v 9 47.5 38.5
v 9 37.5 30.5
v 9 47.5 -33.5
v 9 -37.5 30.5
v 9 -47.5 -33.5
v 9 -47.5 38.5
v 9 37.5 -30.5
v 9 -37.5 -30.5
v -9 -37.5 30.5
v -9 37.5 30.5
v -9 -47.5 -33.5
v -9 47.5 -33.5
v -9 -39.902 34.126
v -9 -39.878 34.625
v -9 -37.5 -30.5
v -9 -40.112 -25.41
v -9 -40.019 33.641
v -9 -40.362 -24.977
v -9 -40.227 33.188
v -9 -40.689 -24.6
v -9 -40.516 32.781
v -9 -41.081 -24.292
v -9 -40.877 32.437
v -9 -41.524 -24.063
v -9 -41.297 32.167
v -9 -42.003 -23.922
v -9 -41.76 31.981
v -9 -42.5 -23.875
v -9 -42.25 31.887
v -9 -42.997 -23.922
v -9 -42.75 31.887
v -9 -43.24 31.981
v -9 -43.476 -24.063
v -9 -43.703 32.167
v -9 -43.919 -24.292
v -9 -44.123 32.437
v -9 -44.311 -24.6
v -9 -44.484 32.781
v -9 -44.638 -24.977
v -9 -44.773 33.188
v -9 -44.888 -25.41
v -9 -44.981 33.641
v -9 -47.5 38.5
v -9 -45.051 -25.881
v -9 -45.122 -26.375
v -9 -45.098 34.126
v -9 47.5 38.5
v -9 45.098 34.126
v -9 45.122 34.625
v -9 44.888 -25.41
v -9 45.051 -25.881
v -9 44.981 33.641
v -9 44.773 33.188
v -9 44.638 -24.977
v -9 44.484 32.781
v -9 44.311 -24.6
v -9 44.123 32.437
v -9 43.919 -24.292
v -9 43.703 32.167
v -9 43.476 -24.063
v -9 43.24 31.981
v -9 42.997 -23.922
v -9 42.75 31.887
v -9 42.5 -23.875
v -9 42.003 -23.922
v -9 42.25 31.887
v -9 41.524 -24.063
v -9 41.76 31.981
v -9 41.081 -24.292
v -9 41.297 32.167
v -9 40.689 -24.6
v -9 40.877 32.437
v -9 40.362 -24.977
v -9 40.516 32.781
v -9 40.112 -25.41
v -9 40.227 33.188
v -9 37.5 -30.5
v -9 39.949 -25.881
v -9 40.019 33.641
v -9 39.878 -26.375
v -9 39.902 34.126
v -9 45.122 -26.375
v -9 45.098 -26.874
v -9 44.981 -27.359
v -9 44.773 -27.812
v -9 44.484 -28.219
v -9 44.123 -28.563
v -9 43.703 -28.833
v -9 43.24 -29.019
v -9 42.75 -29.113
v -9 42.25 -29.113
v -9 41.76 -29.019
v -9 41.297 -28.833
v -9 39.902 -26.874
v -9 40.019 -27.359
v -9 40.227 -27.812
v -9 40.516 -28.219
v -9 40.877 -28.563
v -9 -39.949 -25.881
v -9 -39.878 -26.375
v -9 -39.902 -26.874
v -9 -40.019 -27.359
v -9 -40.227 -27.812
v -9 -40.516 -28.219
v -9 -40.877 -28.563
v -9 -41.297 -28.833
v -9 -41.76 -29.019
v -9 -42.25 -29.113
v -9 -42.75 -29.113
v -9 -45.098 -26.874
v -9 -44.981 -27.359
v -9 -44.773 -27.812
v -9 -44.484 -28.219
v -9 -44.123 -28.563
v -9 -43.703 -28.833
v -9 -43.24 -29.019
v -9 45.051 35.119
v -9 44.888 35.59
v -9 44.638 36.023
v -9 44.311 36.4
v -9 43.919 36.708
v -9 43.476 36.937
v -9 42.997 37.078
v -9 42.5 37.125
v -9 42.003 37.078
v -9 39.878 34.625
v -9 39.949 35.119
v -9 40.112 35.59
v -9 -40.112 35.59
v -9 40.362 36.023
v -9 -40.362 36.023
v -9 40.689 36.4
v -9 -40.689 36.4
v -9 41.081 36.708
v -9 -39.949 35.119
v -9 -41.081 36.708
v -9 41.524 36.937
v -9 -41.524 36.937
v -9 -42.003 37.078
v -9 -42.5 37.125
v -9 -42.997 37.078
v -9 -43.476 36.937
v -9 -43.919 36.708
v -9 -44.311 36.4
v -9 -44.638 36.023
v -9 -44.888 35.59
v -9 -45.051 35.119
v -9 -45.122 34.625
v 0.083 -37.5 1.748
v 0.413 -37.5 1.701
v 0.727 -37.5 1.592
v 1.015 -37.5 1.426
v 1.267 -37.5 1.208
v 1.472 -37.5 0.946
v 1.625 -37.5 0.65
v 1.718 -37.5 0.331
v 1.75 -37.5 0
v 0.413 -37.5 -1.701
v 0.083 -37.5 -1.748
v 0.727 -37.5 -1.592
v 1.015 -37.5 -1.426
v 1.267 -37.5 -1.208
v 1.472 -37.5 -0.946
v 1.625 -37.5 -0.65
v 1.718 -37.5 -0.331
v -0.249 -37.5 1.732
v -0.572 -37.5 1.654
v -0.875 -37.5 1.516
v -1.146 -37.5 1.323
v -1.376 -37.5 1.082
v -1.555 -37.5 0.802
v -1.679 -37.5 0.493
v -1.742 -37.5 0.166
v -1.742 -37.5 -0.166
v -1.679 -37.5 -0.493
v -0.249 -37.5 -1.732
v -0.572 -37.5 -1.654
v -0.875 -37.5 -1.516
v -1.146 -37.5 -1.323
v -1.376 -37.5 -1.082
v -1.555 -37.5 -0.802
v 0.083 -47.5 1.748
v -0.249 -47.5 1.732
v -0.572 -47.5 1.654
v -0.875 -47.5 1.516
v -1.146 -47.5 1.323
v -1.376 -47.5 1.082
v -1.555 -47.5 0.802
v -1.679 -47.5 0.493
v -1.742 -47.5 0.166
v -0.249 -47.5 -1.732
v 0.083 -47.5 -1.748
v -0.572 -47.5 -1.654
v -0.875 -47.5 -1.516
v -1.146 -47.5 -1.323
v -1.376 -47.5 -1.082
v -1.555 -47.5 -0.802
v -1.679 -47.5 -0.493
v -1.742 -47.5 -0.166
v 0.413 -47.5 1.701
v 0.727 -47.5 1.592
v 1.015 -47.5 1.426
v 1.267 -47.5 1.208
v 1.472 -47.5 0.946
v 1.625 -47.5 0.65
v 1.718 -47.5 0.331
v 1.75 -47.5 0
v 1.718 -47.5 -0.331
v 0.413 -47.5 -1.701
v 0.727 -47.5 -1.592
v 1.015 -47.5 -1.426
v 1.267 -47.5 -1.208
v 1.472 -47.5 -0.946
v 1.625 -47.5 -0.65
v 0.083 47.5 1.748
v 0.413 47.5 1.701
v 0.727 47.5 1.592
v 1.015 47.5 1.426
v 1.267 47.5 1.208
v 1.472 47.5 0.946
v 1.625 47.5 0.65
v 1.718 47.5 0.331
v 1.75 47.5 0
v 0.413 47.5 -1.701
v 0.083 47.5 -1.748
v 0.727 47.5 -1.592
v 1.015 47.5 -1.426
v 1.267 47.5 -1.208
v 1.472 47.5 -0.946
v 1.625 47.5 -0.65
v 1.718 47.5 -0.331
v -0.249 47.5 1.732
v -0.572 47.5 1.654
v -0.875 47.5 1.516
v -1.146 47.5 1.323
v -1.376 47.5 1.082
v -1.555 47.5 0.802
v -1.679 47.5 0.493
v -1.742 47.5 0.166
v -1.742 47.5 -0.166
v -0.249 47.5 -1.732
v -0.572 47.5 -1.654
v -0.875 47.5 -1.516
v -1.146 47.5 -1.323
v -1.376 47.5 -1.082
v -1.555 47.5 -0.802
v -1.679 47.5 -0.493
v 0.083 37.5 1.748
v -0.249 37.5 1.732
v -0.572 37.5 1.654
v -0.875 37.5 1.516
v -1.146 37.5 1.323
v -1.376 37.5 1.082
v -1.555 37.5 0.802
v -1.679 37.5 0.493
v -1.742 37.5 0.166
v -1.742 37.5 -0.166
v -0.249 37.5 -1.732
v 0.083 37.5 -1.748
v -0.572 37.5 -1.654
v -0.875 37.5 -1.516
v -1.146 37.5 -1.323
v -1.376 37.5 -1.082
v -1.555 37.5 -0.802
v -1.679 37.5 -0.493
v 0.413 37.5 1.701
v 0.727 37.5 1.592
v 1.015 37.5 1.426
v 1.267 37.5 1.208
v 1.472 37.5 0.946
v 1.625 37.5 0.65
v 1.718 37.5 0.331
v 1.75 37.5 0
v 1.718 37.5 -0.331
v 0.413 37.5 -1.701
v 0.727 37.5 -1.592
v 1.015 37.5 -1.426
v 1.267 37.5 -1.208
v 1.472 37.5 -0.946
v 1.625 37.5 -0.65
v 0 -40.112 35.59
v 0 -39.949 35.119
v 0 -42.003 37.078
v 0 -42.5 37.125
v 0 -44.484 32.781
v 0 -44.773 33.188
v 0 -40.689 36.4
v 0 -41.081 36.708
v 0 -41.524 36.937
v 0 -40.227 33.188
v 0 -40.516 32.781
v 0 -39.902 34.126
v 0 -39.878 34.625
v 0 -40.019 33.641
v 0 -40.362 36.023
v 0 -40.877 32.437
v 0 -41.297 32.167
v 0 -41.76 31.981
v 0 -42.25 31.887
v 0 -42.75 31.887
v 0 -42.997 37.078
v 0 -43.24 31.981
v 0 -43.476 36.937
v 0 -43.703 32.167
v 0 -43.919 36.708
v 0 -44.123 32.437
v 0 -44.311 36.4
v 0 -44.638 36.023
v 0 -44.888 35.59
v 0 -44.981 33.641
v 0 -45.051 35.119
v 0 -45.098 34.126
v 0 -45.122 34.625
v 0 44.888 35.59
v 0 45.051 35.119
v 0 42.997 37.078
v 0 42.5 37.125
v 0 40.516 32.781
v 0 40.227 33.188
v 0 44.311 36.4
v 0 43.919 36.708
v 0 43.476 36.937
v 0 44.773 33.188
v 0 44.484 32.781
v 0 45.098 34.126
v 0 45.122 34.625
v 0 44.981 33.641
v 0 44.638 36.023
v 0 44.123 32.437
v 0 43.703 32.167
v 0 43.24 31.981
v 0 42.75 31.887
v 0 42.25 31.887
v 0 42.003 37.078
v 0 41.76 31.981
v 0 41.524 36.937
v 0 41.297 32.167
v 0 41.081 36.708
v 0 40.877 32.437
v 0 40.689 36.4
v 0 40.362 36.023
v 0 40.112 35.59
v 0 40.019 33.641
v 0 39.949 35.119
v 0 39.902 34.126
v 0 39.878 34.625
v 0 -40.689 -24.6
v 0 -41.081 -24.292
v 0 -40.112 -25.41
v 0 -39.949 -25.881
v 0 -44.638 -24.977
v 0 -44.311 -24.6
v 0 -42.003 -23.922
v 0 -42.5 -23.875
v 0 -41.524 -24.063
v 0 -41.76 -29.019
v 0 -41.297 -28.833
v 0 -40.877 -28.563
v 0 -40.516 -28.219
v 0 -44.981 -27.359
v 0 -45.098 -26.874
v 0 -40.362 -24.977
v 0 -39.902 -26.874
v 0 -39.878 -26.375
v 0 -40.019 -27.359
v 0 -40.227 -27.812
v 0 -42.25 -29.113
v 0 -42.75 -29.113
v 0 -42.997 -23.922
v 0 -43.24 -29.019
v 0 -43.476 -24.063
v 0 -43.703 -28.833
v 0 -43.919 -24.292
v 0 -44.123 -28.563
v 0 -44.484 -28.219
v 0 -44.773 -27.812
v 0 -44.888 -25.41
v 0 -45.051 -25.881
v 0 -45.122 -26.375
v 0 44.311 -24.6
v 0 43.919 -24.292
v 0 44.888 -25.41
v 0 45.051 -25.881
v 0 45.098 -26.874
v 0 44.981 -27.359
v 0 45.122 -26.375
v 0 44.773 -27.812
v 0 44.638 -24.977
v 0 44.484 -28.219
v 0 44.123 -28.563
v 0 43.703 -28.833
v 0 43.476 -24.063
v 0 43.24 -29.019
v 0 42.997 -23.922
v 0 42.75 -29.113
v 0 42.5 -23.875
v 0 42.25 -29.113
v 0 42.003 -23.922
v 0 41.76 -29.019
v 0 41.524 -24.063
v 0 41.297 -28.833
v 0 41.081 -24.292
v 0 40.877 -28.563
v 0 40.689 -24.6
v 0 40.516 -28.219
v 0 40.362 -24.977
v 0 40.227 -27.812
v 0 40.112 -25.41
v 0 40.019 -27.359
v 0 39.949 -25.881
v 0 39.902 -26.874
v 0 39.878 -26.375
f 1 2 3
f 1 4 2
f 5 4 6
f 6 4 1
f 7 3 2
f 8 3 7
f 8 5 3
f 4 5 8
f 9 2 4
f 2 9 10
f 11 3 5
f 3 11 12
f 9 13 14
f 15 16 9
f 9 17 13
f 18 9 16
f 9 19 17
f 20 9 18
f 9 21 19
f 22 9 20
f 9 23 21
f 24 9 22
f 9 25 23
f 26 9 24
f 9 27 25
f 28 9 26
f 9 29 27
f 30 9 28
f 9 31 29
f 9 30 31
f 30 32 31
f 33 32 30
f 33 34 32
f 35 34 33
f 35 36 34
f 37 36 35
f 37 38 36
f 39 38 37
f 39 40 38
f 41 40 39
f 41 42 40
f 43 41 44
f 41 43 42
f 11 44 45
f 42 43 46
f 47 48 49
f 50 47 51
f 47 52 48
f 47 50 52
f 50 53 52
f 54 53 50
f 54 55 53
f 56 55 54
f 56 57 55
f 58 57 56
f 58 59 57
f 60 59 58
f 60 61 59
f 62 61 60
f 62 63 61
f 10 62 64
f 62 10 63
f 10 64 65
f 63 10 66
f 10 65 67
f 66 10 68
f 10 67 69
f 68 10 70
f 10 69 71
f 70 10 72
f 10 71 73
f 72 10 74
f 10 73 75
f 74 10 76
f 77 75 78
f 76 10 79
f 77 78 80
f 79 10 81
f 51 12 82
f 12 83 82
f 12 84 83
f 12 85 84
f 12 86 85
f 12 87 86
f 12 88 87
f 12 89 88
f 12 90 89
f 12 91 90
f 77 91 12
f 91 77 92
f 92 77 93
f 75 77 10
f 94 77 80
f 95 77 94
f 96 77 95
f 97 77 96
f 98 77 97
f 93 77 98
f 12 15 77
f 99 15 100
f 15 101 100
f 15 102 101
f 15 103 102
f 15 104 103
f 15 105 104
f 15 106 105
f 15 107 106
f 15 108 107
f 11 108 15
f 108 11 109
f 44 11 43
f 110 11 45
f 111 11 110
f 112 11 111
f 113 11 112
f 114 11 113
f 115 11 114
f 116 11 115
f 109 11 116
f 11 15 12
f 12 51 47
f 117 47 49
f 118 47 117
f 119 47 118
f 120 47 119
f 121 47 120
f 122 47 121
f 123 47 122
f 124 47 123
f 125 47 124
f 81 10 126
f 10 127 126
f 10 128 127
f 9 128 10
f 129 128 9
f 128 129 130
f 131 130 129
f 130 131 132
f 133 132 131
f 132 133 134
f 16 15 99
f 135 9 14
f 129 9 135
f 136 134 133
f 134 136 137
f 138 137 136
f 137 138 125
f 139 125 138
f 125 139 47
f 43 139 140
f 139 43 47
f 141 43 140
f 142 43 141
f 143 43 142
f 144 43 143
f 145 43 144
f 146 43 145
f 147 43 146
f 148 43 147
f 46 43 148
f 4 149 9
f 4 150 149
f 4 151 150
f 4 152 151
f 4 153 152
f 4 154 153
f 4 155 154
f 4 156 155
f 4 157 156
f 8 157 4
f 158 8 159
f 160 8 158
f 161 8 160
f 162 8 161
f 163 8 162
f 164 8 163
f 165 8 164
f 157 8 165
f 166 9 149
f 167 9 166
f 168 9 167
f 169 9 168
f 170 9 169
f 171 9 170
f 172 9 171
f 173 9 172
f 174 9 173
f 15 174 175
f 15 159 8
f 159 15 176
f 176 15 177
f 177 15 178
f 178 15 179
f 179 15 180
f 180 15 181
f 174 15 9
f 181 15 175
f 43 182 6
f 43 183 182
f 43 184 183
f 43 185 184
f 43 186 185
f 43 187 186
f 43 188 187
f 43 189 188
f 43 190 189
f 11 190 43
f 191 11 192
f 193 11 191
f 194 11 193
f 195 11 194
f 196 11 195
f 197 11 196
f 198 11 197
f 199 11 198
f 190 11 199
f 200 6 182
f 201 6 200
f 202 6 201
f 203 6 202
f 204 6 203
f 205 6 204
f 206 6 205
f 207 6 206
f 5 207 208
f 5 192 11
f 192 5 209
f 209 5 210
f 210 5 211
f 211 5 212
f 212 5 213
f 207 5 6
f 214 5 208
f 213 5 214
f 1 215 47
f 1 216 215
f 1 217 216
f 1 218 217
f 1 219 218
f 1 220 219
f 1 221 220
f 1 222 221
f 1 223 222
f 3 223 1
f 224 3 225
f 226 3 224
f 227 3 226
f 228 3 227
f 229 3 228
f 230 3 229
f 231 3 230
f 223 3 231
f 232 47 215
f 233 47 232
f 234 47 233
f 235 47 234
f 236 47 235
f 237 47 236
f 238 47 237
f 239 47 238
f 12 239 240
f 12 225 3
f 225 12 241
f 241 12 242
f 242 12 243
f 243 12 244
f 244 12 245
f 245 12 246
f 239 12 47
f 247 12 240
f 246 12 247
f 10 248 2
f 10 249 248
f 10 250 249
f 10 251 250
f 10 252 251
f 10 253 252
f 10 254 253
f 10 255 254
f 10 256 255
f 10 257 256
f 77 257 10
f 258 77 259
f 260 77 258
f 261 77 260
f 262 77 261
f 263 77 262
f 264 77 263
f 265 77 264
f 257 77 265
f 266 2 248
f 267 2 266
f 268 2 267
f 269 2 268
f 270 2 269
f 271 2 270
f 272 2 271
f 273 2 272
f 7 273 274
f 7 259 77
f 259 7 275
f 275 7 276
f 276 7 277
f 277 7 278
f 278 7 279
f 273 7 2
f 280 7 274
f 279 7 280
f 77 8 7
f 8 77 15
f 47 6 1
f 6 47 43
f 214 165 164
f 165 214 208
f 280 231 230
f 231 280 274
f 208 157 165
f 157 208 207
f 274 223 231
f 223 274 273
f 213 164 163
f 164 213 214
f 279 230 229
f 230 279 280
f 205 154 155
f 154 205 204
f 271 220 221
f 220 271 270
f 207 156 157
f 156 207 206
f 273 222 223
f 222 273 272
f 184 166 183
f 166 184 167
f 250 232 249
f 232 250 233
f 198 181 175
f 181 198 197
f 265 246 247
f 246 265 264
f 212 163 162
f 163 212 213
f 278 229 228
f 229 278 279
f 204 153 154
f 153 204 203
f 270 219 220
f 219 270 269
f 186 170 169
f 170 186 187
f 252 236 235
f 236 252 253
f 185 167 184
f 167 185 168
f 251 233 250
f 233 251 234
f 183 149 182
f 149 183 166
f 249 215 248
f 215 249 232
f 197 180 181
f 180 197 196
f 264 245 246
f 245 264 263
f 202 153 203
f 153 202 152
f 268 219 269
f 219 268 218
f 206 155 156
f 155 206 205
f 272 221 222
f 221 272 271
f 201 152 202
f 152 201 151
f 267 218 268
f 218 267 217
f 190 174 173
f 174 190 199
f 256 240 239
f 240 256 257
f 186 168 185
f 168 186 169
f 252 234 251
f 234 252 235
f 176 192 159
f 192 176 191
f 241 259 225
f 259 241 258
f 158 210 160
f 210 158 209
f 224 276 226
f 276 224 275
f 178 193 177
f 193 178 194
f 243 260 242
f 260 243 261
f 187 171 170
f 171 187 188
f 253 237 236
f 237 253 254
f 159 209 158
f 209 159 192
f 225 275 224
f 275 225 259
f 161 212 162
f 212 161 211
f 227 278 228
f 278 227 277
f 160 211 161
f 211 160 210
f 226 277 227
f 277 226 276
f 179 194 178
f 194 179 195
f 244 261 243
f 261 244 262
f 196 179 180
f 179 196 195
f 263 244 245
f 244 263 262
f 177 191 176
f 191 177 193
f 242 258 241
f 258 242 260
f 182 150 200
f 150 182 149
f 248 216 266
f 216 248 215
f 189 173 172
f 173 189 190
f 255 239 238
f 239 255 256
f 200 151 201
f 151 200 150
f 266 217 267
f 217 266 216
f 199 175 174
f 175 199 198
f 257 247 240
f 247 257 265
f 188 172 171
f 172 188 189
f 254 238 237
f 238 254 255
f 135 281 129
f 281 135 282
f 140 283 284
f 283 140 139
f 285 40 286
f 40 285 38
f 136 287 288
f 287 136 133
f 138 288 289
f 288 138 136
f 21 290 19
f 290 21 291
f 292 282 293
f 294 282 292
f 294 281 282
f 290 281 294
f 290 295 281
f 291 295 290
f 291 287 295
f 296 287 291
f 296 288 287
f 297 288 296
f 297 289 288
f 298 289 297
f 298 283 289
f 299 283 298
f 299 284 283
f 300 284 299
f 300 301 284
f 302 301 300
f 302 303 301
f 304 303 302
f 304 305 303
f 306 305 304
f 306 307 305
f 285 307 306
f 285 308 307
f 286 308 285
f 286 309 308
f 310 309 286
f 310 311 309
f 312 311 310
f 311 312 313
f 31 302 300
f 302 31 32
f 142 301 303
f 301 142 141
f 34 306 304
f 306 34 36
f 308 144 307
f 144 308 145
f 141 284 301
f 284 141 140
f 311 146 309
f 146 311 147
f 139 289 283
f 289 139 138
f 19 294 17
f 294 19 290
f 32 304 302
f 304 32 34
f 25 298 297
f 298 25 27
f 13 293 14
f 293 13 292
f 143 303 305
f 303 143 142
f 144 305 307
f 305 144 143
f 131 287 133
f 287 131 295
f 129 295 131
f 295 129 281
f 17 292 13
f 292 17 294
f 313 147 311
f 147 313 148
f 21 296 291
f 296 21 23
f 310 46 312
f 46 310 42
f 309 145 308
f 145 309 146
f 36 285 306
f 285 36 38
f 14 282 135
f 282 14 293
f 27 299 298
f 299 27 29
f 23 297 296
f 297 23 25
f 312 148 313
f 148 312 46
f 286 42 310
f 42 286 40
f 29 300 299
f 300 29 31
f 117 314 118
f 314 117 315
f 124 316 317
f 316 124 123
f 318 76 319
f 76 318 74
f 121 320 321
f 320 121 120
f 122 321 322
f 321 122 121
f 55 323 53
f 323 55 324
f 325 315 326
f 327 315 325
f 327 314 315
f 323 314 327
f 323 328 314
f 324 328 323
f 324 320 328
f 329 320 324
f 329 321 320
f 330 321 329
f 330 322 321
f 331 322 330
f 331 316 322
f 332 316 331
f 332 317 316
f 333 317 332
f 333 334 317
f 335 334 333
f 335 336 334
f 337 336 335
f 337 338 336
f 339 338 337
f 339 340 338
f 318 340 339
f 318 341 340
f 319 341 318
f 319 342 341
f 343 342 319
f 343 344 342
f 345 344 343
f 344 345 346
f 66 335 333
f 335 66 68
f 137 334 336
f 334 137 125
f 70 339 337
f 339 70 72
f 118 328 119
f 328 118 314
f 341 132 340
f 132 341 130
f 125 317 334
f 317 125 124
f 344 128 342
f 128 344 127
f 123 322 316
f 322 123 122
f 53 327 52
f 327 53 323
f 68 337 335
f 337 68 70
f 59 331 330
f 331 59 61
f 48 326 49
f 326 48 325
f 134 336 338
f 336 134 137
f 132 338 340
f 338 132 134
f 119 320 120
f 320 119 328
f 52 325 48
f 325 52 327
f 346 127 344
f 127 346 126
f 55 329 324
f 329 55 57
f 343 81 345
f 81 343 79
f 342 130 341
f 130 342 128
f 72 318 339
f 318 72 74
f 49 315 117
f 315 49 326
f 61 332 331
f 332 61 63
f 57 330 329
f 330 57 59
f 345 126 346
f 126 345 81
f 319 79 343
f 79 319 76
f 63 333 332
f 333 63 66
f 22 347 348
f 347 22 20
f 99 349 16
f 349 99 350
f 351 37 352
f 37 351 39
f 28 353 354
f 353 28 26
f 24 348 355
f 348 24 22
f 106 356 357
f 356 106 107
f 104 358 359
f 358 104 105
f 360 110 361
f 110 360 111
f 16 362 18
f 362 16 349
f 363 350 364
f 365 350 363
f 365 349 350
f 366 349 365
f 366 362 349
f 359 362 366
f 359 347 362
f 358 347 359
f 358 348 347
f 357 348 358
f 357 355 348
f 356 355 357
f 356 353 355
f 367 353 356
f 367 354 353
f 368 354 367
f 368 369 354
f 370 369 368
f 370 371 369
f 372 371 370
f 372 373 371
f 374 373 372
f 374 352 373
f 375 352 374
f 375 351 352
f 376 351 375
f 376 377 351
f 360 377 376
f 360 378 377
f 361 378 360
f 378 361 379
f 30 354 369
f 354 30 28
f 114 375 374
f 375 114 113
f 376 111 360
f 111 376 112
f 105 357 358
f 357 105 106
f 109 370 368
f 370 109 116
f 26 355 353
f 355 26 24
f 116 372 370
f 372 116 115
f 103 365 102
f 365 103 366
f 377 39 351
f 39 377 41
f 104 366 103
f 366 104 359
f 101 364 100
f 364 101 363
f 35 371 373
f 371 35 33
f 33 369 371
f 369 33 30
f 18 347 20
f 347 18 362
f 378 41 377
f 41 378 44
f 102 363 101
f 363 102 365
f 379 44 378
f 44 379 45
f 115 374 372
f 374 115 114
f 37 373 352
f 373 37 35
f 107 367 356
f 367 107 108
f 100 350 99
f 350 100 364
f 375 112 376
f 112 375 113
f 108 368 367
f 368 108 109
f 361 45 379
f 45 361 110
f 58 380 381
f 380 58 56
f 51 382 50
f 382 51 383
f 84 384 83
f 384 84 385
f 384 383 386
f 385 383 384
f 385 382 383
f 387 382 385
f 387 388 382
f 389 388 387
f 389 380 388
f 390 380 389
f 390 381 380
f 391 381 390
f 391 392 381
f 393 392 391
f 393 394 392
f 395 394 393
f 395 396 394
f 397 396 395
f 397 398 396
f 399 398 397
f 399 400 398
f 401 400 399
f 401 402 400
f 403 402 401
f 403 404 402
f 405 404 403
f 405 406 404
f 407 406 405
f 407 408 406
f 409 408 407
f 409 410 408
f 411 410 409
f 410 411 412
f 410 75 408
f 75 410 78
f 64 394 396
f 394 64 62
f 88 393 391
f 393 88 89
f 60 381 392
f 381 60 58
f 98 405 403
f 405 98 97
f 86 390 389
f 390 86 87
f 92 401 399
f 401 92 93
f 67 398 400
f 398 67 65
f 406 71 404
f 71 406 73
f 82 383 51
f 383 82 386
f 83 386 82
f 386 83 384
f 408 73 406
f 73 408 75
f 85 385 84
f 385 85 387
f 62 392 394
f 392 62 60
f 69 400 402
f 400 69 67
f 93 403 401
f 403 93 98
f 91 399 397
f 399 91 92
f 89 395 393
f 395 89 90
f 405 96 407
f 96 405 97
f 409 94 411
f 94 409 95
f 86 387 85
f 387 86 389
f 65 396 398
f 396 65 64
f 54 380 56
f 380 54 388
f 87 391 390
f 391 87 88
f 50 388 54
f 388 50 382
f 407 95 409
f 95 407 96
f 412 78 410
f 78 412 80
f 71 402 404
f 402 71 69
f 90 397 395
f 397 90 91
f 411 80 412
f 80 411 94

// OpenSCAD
// MOJO 5bar
//include <Getriebe.scad>;  //gear library

$fn=33;
//m3 holes
m3_hr=1.75; //m3  3.5/2
m3_hd=m3_hr*2;
m4_hr=2.15; //m4
m4_hd=m4_hr*2;
post_hd = m3_hd - 0.5;
//bearing
bearing_OD = 22.6;  //perfect for fit(?)
bearing_ID = 8;  //8.2  -- 8 for size
bearing_h = 7;
//servo - MG995
servo_l =40;
servo_w = 20;    // servo_w is the width of a single servo (mg995)
servo_h = 35;
servo_d = 2;
servo_nob_d = 16;
servo_nob_h = 8;
servo_tab = 7;
servo_tab_pos = 8;    // servo_tab_pos (8) is the (x/depth) offset between the axis and where the tabs are.
servo_gear = 6;
servo_hole_d = 2.5;    //hole size for the servo mounting screws. 2 is too small.

//servo arm
servo_arm_h = 5;
servo_arm_l = 40;
servo_pin_d = 2;

link_h = 3;

//servo Mount - holds two servos together in tandem
servo_mount_w = 80;  //depreciated?  --> using servo_l
servo_mount_thick = 18;     // servo_mount_thick is the width of the component (x) deep
servo_mount_h = 10;    // servo_mount_h is the hight of the main block, being reduced now
side_w = 3;

//yaw Mount - holds the servo mount on an axis, supports yaw servo
yaw_space_w = 15;
yaw_space_h = 15;
yaw_mount_w = servo_l+servo_mount_h*2+yaw_space_w;  //servo mount width plus space around it
yaw_mount_h = servo_w*2 + side_w*2 + yaw_space_h; //servo sizing
yaw_mount_thick = servo_mount_thick; // depth x direction around 18
yaw_block = 10; //thickness for the structure mount
yaw_top = 8; //thickness at top for structure
yaw_bottom = 3; //thickenss at bottom

//dowel
dowel_d = 5.25;

//upper leg
servo_hub = 12;
servo_hub_h = 5;
//servo_gear = 6;  //reference
up_leg_l = 70;
up_leg_w = 16;
up_leg_h = 6;
//lower leg
low_leg_l = 20; // from knee
low_leg_w = 8;
low_leg_h = 6;
low_leg_offset = 8; //position of stable screw from end hole
//paw
paw_stem = 25;
paw_stem_d = 24;

//hip cam
hip_cam_r = 20;  //this one drives most of the connector lengths off of axis


module servo(){
    //center the axis - draw vertical
    rotate([180,0,0]){
        translate([-servo_h,-servo_w/2,-servo_w/2]) cube([servo_h, servo_w, servo_l]);
        rotate([0,90,0]) cylinder(d=servo_nob_d, h=servo_nob_h/2);
        rotate([0,90,0]) cylinder(d=servo_nob_d/2, h=servo_nob_h);
        translate([-servo_tab_pos,-servo_w/2,-servo_w/2-servo_tab]) cube([2.7, servo_w, servo_l+(servo_tab*2)]);
    }
}
module servo_arm(){
//part is upside down
    difference(){
        union(){
            hull(){
                translate([0,0,0]) cylinder(d=servo_hub, h=servo_arm_h);
                translate([hip_cam_r,0,0]) cylinder(d=servo_pin_d*3, h=servo_arm_h/2);
            }
        }
        union(){
            translate([0,0,1]) cylinder(d=servo_gear, h=servo_arm_h);  //gear part
            translate([0,0,-1]) cylinder(d=m3_hd, h=servo_arm_h);  //gear part
            translate([hip_cam_r,0,-1]) cylinder(d=servo_pin_d, h=servo_arm_h+2);
        }
    }
}
module cam_link(){
    difference(){
        union(){
            hull(){
                translate([0,0,0]) cylinder(d=servo_pin_d*3, h=link_h);
                translate([hip_cam_r,0,0]) cylinder(d=servo_pin_d*3, h=link_h);
            }
        }
        union(){
            translate([0,0,-1]) cylinder(d=servo_pin_d, h=servo_arm_h+2); 
            translate([hip_cam_r,0,-1]) cylinder(d=servo_pin_d, h=servo_arm_h+2);
        }
    }
}
module upper_leg(){
    difference(){
        union(){
            hull(){
                cylinder(d=up_leg_w,h=up_leg_h);
                translate([70,0,0])cylinder(d=up_leg_w/2,h=up_leg_h);
            }
            cylinder(d=servo_hub,h=up_leg_h+servo_hub_h);
        }
        union(){
            translate([0,0,up_leg_h])cylinder(d=servo_gear,h=servo_hub_h+1);
            translate([70,0,-1])cylinder(d=m3_hd,h=up_leg_h+2);
        }
    }
}
module lower_leg_a(){
    difference(){
        union(){
            hull(){
                translate([-hip_cam_r,0,0])cylinder(d=low_leg_w,h=low_leg_h);
                translate([low_leg_l,0,0])cylinder(d=low_leg_w,h=low_leg_h);
            }
            hull(){
                translate([low_leg_l-low_leg_offset,0,low_leg_h])cylinder(d=low_leg_w,h=low_leg_h);
                translate([low_leg_l,0,low_leg_h])cylinder(d=low_leg_w,h=low_leg_h);
            }
            hull(){
                translate([low_leg_l,0,0])cylinder(d=low_leg_w,h=low_leg_h);
                translate([low_leg_l,0,low_leg_h])cylinder(d=low_leg_w,h=low_leg_h);
                translate([low_leg_l+5,0,paw_stem_d/2+1])rotate([0,90,0])cylinder(d=paw_stem_d+2,h=paw_stem);
            }
        }
        union(){
            translate([0,0,-1])cylinder(d=m3_hd,h=low_leg_h+2);
            translate([-hip_cam_r,0,-1])cylinder(d=m3_hd,h=low_leg_h+2);
            translate([low_leg_l-low_leg_offset,0,-1])cylinder(d=m3_hd,h=low_leg_h*2+2);
            translate([low_leg_l,0,-1])cylinder(d=m3_hd,h=low_leg_h*2+2);
            //paw
            translate([low_leg_l+5,0,paw_stem_d/2+1])rotate([0,90,0])cylinder(d1=paw_stem_d,d2=paw_stem_d-2,h=paw_stem+1);
            //neg half
            translate([low_leg_l-5,-paw_stem_d/2-1,low_leg_h*2])cube([paw_stem+11,paw_stem_d+2,paw_stem_d/2+5]);
        }
    }
}
module lower_leg_b(){
    difference(){
        union(){
            hull(){
                translate([-hip_cam_r,0,0])cylinder(d=low_leg_w,h=low_leg_h);
                translate([low_leg_l,0,0])cylinder(d=low_leg_w,h=low_leg_h);
            }
        }
        union(){
            translate([0,0,-1])cylinder(d=m3_hd,h=low_leg_h+2);
            translate([-hip_cam_r,0,-1])cylinder(d=m3_hd,h=low_leg_h+2);
            translate([low_leg_l-low_leg_offset,0,-1])cylinder(d=m3_hd,h=low_leg_h*2+2);
            translate([low_leg_l,0,-1])cylinder(d=m3_hd,h=low_leg_h*2+2);
        }
    }
}
module hip_cam(){
    tol = 0.8;

    difference(){
        union(){
            hull(){
                cylinder(d=servo_hub+6,h=servo_hub_h);
                translate([hip_cam_r,0,0])cylinder(d=m3_hd+4,h=servo_hub_h);
                translate([0,hip_cam_r,0])cylinder(d=m3_hd+4,h=servo_hub_h);
            }
        }
        union(){
            translate([0,0,-1])cylinder(d=servo_hub+tol,h=servo_hub_h+2);
            //connector holes
            translate([hip_cam_r,0,-1])cylinder(d=m3_hd,h=servo_hub_h+2);
            translate([0,hip_cam_r,-1])cylinder(d=m3_hd,h=servo_hub_h+2);
        }
    }

}


module servo_mount(){
    // V5 \\
    tol = 0.7;
    screw_offset = 3.5;  //side screw offset from BOTH middle and end/tops
    // everything has been offset from the prime servo axis
    // servo_tab_pos (8) is the (x/depth) offset between the axis and where the tabs are.
    // servo_mount_thick is the width of the component (x) deep
    // servo_w is the width of a single servo (mg995)
    // servo_mount_h is the hight of the main block, being reduced now
    difference(){
        union(){
            // main block on end of servo w/servo mount holes
            translate([-servo_mount_thick-servo_tab_pos,-servo_w/2,servo_w/2])cube([servo_mount_thick,servo_w*2+tol,servo_mount_h]);
            //side connect
            translate([-servo_mount_thick-servo_tab_pos,-servo_w/2-side_w,servo_w/2-servo_l-servo_mount_h-tol])cube([servo_mount_thick,side_w,servo_l+servo_mount_h*2+tol]);
        }
        union(){
            //screw mount holes for servo
            translate([-servo_tab_pos+.1,-servo_w/4,servo_tab/2+servo_w/2])rotate([0,-90,0])cylinder(d=servo_hole_d,h=8);
            translate([-servo_tab_pos+.1,+servo_w/4,servo_tab/2+servo_w/2])rotate([0,-90,0])cylinder(d=servo_hole_d,h=8);
            translate([-servo_tab_pos+.1,servo_w/2+servo_w/4,servo_tab/2+servo_w/2])rotate([0,-90,0])cylinder(d=servo_hole_d,h=8);
            translate([-servo_tab_pos+.1,servo_w+servo_w/4,servo_tab/2+servo_w/2])rotate([0,-90,0])cylinder(d=servo_hole_d,h=8);
            //side screw hole
            translate([-servo_tab_pos-screw_offset,-servo_w/2-side_w-1,servo_w/2-servo_l-servo_mount_h+screw_offset-tol])rotate([-90,0,0])cylinder(d=post_hd,h=side_w+2);
            translate([-servo_mount_thick-servo_tab_pos+screw_offset,-servo_w/2-side_w-1,servo_w/2-servo_l-servo_mount_h+screw_offset-tol])rotate([-90,0,0])cylinder(d=post_hd,h=side_w+2);
            //uppers side screw holes
            translate([-servo_tab_pos-screw_offset,servo_w*3/2-7,servo_w/2+servo_mount_h-screw_offset])rotate([-90,0,0])cylinder(d=post_hd,h=7+2);
            translate([-servo_tab_pos-servo_mount_thick+screw_offset,servo_w*3/2-7,servo_w/2+servo_mount_h-screw_offset])rotate([-90,0,0])cylinder(d=post_hd,h=7+2);
            //Yaw Axis Holes for holding the axels (M3: 30mm shaft, 2mm head, 4mm head d)
            translate([-servo_mount_thick/2-servo_tab_pos,+servo_w/2,servo_w/2-1])rotate([0,0,0])cylinder(d=m3_hd, h=30+2+2);  //shaft
            translate([-servo_mount_thick/2-servo_tab_pos,+servo_w/2,servo_w/2-1])rotate([0,0,0])cylinder(d=5+1, h=3+1);  //recess d5+1tol, depth 2=>3 
        }

    }
    
    //servos
    //translate([0,0,0])rotate([0,0,0])color("Tomato", 0.75)servo();
    //translate([0,servo_w,-servo_w])rotate([180,0,0])color("Tomato", 0.75)servo();
   
}
module yaw_mount(){
    //*** V1 ***\\
    // This component holds the servo mount and provides the yaw to the leg
    // oriented around main axis and center for symetry
    //yaw_space_w = 20;
    //yaw_space_h = 20;
    //yaw_mount_w = servo_l+servo_mount_h*2+yaw_space_w;  //servo mount width plus space around it
    //yaw_mount_h = servo_2*2 + side_2*2 + yaw_space_h; //servo sizing
    //yaw_mount_thick = servo_mount_thick; // depth x direction around 18
    //yaw_block = 10; //thickness for the structure mount
    //yaw_top = 8; //thickness at top for structure
    //yaw_bottom = 3; //thickenss at bottomtructure

    difference(){
        union(){
            //sides
            translate([-yaw_mount_thick/2,-yaw_mount_w/2-yaw_block,-yaw_mount_h/2-yaw_bottom])cube([yaw_mount_thick,yaw_block,yaw_mount_h+yaw_bottom]);
            translate([-yaw_mount_thick/2,yaw_mount_w/2,-yaw_mount_h/2-yaw_bottom])cube([yaw_mount_thick,yaw_block,yaw_mount_h+yaw_bottom]);
            //bottom - thin
            translate([-yaw_mount_thick/2,-yaw_mount_w/2,-yaw_mount_h/2-yaw_bottom])cube([yaw_mount_thick,yaw_mount_w,yaw_bottom]);
            //top - thicker for structure
            translate([-yaw_mount_thick/2,-yaw_mount_w/2-yaw_block,yaw_mount_h/2])cube([yaw_mount_thick,yaw_mount_w+yaw_block*2,yaw_top]);
        }
        union(){
            //axis holes  - doing 1 long for rough placement
            translate([0,-yaw_mount_w/2-30-1,0])rotate([-90,0,0])cylinder(d=m3_hd, h= yaw_mount_w+60);
            
            //dowel holes
            translate([0,-yaw_mount_w/2-yaw_block/2,yaw_mount_h/2+yaw_top/2])rotate([0,-90,0])cylinder(d=dowel_d, h=20);
            translate([0,yaw_mount_w/2+yaw_block/2,yaw_mount_h/2+yaw_top/2])rotate([0,-90,0])cylinder(d=dowel_d, h=20);
            translate([0,-yaw_mount_w/2-yaw_block/2,-yaw_mount_h/2+yaw_top/2])rotate([0,-90,0])cylinder(d=dowel_d, h=20);
            translate([0,yaw_mount_w/2+yaw_block/2,-yaw_mount_h/2+yaw_top/2])rotate([0,-90,0])cylinder(d=dowel_d, h=20);

        }
    }
}

module layout(){
    //servo();
    //servo_mount();
    yaw_mount();
    //servo_arm();
    //cam_link();
    //upper_leg();
    //lower_leg_a();
    //lower_leg_b();
    //hip_cam();

}

module leg_assembly(){

    //servos
    translate([0,0,0])rotate([0,0,0])color("Tomato", 0.75)servo();
    translate([0,servo_w,-servo_w])rotate([180,0,0])color("Tomato", 0.75)servo();
    //servo mount
    translate([0,0,0])rotate([0,0,0])servo_mount();
    translate([0,servo_w,-20.7])rotate([180,0,0])servo_mount();
    //upper leg
    translate([15,0,0])rotate([0,-90,0])rotate([0,0,-120])color("Yellow", 0.9)upper_leg();
    //cam
    translate([10,0,0])rotate([0,-90,0])rotate([0,0,-30])color("Blue", 0.90)hip_cam();
    //servo arm
    translate([10,20,-20])rotate([0,-90,0])rotate([0,0,40])color("Blue", 0.90)servo_arm();
    //cam link
    translate([13,18,11])rotate([0,-90,0])rotate([0,-0,135])color("Blue", 0.7)cam_link();
}
module full_leg_assembly(){
    //the first rotate effects the "yaw"
    rotate([0,0,0])translate([servo_mount_thick/2+servo_tab_pos,-servo_w/2,-servo_w/2])rotate([90,0,0])leg_assembly();
    translate([0,0,0])rotate([0,0,0])yaw_mount();
    
}
module assembly(){

}

//[[***** CONSTRUTION  ********]]//
layout();
//leg_assembly();
//full_leg_assembly();
//assembly();
